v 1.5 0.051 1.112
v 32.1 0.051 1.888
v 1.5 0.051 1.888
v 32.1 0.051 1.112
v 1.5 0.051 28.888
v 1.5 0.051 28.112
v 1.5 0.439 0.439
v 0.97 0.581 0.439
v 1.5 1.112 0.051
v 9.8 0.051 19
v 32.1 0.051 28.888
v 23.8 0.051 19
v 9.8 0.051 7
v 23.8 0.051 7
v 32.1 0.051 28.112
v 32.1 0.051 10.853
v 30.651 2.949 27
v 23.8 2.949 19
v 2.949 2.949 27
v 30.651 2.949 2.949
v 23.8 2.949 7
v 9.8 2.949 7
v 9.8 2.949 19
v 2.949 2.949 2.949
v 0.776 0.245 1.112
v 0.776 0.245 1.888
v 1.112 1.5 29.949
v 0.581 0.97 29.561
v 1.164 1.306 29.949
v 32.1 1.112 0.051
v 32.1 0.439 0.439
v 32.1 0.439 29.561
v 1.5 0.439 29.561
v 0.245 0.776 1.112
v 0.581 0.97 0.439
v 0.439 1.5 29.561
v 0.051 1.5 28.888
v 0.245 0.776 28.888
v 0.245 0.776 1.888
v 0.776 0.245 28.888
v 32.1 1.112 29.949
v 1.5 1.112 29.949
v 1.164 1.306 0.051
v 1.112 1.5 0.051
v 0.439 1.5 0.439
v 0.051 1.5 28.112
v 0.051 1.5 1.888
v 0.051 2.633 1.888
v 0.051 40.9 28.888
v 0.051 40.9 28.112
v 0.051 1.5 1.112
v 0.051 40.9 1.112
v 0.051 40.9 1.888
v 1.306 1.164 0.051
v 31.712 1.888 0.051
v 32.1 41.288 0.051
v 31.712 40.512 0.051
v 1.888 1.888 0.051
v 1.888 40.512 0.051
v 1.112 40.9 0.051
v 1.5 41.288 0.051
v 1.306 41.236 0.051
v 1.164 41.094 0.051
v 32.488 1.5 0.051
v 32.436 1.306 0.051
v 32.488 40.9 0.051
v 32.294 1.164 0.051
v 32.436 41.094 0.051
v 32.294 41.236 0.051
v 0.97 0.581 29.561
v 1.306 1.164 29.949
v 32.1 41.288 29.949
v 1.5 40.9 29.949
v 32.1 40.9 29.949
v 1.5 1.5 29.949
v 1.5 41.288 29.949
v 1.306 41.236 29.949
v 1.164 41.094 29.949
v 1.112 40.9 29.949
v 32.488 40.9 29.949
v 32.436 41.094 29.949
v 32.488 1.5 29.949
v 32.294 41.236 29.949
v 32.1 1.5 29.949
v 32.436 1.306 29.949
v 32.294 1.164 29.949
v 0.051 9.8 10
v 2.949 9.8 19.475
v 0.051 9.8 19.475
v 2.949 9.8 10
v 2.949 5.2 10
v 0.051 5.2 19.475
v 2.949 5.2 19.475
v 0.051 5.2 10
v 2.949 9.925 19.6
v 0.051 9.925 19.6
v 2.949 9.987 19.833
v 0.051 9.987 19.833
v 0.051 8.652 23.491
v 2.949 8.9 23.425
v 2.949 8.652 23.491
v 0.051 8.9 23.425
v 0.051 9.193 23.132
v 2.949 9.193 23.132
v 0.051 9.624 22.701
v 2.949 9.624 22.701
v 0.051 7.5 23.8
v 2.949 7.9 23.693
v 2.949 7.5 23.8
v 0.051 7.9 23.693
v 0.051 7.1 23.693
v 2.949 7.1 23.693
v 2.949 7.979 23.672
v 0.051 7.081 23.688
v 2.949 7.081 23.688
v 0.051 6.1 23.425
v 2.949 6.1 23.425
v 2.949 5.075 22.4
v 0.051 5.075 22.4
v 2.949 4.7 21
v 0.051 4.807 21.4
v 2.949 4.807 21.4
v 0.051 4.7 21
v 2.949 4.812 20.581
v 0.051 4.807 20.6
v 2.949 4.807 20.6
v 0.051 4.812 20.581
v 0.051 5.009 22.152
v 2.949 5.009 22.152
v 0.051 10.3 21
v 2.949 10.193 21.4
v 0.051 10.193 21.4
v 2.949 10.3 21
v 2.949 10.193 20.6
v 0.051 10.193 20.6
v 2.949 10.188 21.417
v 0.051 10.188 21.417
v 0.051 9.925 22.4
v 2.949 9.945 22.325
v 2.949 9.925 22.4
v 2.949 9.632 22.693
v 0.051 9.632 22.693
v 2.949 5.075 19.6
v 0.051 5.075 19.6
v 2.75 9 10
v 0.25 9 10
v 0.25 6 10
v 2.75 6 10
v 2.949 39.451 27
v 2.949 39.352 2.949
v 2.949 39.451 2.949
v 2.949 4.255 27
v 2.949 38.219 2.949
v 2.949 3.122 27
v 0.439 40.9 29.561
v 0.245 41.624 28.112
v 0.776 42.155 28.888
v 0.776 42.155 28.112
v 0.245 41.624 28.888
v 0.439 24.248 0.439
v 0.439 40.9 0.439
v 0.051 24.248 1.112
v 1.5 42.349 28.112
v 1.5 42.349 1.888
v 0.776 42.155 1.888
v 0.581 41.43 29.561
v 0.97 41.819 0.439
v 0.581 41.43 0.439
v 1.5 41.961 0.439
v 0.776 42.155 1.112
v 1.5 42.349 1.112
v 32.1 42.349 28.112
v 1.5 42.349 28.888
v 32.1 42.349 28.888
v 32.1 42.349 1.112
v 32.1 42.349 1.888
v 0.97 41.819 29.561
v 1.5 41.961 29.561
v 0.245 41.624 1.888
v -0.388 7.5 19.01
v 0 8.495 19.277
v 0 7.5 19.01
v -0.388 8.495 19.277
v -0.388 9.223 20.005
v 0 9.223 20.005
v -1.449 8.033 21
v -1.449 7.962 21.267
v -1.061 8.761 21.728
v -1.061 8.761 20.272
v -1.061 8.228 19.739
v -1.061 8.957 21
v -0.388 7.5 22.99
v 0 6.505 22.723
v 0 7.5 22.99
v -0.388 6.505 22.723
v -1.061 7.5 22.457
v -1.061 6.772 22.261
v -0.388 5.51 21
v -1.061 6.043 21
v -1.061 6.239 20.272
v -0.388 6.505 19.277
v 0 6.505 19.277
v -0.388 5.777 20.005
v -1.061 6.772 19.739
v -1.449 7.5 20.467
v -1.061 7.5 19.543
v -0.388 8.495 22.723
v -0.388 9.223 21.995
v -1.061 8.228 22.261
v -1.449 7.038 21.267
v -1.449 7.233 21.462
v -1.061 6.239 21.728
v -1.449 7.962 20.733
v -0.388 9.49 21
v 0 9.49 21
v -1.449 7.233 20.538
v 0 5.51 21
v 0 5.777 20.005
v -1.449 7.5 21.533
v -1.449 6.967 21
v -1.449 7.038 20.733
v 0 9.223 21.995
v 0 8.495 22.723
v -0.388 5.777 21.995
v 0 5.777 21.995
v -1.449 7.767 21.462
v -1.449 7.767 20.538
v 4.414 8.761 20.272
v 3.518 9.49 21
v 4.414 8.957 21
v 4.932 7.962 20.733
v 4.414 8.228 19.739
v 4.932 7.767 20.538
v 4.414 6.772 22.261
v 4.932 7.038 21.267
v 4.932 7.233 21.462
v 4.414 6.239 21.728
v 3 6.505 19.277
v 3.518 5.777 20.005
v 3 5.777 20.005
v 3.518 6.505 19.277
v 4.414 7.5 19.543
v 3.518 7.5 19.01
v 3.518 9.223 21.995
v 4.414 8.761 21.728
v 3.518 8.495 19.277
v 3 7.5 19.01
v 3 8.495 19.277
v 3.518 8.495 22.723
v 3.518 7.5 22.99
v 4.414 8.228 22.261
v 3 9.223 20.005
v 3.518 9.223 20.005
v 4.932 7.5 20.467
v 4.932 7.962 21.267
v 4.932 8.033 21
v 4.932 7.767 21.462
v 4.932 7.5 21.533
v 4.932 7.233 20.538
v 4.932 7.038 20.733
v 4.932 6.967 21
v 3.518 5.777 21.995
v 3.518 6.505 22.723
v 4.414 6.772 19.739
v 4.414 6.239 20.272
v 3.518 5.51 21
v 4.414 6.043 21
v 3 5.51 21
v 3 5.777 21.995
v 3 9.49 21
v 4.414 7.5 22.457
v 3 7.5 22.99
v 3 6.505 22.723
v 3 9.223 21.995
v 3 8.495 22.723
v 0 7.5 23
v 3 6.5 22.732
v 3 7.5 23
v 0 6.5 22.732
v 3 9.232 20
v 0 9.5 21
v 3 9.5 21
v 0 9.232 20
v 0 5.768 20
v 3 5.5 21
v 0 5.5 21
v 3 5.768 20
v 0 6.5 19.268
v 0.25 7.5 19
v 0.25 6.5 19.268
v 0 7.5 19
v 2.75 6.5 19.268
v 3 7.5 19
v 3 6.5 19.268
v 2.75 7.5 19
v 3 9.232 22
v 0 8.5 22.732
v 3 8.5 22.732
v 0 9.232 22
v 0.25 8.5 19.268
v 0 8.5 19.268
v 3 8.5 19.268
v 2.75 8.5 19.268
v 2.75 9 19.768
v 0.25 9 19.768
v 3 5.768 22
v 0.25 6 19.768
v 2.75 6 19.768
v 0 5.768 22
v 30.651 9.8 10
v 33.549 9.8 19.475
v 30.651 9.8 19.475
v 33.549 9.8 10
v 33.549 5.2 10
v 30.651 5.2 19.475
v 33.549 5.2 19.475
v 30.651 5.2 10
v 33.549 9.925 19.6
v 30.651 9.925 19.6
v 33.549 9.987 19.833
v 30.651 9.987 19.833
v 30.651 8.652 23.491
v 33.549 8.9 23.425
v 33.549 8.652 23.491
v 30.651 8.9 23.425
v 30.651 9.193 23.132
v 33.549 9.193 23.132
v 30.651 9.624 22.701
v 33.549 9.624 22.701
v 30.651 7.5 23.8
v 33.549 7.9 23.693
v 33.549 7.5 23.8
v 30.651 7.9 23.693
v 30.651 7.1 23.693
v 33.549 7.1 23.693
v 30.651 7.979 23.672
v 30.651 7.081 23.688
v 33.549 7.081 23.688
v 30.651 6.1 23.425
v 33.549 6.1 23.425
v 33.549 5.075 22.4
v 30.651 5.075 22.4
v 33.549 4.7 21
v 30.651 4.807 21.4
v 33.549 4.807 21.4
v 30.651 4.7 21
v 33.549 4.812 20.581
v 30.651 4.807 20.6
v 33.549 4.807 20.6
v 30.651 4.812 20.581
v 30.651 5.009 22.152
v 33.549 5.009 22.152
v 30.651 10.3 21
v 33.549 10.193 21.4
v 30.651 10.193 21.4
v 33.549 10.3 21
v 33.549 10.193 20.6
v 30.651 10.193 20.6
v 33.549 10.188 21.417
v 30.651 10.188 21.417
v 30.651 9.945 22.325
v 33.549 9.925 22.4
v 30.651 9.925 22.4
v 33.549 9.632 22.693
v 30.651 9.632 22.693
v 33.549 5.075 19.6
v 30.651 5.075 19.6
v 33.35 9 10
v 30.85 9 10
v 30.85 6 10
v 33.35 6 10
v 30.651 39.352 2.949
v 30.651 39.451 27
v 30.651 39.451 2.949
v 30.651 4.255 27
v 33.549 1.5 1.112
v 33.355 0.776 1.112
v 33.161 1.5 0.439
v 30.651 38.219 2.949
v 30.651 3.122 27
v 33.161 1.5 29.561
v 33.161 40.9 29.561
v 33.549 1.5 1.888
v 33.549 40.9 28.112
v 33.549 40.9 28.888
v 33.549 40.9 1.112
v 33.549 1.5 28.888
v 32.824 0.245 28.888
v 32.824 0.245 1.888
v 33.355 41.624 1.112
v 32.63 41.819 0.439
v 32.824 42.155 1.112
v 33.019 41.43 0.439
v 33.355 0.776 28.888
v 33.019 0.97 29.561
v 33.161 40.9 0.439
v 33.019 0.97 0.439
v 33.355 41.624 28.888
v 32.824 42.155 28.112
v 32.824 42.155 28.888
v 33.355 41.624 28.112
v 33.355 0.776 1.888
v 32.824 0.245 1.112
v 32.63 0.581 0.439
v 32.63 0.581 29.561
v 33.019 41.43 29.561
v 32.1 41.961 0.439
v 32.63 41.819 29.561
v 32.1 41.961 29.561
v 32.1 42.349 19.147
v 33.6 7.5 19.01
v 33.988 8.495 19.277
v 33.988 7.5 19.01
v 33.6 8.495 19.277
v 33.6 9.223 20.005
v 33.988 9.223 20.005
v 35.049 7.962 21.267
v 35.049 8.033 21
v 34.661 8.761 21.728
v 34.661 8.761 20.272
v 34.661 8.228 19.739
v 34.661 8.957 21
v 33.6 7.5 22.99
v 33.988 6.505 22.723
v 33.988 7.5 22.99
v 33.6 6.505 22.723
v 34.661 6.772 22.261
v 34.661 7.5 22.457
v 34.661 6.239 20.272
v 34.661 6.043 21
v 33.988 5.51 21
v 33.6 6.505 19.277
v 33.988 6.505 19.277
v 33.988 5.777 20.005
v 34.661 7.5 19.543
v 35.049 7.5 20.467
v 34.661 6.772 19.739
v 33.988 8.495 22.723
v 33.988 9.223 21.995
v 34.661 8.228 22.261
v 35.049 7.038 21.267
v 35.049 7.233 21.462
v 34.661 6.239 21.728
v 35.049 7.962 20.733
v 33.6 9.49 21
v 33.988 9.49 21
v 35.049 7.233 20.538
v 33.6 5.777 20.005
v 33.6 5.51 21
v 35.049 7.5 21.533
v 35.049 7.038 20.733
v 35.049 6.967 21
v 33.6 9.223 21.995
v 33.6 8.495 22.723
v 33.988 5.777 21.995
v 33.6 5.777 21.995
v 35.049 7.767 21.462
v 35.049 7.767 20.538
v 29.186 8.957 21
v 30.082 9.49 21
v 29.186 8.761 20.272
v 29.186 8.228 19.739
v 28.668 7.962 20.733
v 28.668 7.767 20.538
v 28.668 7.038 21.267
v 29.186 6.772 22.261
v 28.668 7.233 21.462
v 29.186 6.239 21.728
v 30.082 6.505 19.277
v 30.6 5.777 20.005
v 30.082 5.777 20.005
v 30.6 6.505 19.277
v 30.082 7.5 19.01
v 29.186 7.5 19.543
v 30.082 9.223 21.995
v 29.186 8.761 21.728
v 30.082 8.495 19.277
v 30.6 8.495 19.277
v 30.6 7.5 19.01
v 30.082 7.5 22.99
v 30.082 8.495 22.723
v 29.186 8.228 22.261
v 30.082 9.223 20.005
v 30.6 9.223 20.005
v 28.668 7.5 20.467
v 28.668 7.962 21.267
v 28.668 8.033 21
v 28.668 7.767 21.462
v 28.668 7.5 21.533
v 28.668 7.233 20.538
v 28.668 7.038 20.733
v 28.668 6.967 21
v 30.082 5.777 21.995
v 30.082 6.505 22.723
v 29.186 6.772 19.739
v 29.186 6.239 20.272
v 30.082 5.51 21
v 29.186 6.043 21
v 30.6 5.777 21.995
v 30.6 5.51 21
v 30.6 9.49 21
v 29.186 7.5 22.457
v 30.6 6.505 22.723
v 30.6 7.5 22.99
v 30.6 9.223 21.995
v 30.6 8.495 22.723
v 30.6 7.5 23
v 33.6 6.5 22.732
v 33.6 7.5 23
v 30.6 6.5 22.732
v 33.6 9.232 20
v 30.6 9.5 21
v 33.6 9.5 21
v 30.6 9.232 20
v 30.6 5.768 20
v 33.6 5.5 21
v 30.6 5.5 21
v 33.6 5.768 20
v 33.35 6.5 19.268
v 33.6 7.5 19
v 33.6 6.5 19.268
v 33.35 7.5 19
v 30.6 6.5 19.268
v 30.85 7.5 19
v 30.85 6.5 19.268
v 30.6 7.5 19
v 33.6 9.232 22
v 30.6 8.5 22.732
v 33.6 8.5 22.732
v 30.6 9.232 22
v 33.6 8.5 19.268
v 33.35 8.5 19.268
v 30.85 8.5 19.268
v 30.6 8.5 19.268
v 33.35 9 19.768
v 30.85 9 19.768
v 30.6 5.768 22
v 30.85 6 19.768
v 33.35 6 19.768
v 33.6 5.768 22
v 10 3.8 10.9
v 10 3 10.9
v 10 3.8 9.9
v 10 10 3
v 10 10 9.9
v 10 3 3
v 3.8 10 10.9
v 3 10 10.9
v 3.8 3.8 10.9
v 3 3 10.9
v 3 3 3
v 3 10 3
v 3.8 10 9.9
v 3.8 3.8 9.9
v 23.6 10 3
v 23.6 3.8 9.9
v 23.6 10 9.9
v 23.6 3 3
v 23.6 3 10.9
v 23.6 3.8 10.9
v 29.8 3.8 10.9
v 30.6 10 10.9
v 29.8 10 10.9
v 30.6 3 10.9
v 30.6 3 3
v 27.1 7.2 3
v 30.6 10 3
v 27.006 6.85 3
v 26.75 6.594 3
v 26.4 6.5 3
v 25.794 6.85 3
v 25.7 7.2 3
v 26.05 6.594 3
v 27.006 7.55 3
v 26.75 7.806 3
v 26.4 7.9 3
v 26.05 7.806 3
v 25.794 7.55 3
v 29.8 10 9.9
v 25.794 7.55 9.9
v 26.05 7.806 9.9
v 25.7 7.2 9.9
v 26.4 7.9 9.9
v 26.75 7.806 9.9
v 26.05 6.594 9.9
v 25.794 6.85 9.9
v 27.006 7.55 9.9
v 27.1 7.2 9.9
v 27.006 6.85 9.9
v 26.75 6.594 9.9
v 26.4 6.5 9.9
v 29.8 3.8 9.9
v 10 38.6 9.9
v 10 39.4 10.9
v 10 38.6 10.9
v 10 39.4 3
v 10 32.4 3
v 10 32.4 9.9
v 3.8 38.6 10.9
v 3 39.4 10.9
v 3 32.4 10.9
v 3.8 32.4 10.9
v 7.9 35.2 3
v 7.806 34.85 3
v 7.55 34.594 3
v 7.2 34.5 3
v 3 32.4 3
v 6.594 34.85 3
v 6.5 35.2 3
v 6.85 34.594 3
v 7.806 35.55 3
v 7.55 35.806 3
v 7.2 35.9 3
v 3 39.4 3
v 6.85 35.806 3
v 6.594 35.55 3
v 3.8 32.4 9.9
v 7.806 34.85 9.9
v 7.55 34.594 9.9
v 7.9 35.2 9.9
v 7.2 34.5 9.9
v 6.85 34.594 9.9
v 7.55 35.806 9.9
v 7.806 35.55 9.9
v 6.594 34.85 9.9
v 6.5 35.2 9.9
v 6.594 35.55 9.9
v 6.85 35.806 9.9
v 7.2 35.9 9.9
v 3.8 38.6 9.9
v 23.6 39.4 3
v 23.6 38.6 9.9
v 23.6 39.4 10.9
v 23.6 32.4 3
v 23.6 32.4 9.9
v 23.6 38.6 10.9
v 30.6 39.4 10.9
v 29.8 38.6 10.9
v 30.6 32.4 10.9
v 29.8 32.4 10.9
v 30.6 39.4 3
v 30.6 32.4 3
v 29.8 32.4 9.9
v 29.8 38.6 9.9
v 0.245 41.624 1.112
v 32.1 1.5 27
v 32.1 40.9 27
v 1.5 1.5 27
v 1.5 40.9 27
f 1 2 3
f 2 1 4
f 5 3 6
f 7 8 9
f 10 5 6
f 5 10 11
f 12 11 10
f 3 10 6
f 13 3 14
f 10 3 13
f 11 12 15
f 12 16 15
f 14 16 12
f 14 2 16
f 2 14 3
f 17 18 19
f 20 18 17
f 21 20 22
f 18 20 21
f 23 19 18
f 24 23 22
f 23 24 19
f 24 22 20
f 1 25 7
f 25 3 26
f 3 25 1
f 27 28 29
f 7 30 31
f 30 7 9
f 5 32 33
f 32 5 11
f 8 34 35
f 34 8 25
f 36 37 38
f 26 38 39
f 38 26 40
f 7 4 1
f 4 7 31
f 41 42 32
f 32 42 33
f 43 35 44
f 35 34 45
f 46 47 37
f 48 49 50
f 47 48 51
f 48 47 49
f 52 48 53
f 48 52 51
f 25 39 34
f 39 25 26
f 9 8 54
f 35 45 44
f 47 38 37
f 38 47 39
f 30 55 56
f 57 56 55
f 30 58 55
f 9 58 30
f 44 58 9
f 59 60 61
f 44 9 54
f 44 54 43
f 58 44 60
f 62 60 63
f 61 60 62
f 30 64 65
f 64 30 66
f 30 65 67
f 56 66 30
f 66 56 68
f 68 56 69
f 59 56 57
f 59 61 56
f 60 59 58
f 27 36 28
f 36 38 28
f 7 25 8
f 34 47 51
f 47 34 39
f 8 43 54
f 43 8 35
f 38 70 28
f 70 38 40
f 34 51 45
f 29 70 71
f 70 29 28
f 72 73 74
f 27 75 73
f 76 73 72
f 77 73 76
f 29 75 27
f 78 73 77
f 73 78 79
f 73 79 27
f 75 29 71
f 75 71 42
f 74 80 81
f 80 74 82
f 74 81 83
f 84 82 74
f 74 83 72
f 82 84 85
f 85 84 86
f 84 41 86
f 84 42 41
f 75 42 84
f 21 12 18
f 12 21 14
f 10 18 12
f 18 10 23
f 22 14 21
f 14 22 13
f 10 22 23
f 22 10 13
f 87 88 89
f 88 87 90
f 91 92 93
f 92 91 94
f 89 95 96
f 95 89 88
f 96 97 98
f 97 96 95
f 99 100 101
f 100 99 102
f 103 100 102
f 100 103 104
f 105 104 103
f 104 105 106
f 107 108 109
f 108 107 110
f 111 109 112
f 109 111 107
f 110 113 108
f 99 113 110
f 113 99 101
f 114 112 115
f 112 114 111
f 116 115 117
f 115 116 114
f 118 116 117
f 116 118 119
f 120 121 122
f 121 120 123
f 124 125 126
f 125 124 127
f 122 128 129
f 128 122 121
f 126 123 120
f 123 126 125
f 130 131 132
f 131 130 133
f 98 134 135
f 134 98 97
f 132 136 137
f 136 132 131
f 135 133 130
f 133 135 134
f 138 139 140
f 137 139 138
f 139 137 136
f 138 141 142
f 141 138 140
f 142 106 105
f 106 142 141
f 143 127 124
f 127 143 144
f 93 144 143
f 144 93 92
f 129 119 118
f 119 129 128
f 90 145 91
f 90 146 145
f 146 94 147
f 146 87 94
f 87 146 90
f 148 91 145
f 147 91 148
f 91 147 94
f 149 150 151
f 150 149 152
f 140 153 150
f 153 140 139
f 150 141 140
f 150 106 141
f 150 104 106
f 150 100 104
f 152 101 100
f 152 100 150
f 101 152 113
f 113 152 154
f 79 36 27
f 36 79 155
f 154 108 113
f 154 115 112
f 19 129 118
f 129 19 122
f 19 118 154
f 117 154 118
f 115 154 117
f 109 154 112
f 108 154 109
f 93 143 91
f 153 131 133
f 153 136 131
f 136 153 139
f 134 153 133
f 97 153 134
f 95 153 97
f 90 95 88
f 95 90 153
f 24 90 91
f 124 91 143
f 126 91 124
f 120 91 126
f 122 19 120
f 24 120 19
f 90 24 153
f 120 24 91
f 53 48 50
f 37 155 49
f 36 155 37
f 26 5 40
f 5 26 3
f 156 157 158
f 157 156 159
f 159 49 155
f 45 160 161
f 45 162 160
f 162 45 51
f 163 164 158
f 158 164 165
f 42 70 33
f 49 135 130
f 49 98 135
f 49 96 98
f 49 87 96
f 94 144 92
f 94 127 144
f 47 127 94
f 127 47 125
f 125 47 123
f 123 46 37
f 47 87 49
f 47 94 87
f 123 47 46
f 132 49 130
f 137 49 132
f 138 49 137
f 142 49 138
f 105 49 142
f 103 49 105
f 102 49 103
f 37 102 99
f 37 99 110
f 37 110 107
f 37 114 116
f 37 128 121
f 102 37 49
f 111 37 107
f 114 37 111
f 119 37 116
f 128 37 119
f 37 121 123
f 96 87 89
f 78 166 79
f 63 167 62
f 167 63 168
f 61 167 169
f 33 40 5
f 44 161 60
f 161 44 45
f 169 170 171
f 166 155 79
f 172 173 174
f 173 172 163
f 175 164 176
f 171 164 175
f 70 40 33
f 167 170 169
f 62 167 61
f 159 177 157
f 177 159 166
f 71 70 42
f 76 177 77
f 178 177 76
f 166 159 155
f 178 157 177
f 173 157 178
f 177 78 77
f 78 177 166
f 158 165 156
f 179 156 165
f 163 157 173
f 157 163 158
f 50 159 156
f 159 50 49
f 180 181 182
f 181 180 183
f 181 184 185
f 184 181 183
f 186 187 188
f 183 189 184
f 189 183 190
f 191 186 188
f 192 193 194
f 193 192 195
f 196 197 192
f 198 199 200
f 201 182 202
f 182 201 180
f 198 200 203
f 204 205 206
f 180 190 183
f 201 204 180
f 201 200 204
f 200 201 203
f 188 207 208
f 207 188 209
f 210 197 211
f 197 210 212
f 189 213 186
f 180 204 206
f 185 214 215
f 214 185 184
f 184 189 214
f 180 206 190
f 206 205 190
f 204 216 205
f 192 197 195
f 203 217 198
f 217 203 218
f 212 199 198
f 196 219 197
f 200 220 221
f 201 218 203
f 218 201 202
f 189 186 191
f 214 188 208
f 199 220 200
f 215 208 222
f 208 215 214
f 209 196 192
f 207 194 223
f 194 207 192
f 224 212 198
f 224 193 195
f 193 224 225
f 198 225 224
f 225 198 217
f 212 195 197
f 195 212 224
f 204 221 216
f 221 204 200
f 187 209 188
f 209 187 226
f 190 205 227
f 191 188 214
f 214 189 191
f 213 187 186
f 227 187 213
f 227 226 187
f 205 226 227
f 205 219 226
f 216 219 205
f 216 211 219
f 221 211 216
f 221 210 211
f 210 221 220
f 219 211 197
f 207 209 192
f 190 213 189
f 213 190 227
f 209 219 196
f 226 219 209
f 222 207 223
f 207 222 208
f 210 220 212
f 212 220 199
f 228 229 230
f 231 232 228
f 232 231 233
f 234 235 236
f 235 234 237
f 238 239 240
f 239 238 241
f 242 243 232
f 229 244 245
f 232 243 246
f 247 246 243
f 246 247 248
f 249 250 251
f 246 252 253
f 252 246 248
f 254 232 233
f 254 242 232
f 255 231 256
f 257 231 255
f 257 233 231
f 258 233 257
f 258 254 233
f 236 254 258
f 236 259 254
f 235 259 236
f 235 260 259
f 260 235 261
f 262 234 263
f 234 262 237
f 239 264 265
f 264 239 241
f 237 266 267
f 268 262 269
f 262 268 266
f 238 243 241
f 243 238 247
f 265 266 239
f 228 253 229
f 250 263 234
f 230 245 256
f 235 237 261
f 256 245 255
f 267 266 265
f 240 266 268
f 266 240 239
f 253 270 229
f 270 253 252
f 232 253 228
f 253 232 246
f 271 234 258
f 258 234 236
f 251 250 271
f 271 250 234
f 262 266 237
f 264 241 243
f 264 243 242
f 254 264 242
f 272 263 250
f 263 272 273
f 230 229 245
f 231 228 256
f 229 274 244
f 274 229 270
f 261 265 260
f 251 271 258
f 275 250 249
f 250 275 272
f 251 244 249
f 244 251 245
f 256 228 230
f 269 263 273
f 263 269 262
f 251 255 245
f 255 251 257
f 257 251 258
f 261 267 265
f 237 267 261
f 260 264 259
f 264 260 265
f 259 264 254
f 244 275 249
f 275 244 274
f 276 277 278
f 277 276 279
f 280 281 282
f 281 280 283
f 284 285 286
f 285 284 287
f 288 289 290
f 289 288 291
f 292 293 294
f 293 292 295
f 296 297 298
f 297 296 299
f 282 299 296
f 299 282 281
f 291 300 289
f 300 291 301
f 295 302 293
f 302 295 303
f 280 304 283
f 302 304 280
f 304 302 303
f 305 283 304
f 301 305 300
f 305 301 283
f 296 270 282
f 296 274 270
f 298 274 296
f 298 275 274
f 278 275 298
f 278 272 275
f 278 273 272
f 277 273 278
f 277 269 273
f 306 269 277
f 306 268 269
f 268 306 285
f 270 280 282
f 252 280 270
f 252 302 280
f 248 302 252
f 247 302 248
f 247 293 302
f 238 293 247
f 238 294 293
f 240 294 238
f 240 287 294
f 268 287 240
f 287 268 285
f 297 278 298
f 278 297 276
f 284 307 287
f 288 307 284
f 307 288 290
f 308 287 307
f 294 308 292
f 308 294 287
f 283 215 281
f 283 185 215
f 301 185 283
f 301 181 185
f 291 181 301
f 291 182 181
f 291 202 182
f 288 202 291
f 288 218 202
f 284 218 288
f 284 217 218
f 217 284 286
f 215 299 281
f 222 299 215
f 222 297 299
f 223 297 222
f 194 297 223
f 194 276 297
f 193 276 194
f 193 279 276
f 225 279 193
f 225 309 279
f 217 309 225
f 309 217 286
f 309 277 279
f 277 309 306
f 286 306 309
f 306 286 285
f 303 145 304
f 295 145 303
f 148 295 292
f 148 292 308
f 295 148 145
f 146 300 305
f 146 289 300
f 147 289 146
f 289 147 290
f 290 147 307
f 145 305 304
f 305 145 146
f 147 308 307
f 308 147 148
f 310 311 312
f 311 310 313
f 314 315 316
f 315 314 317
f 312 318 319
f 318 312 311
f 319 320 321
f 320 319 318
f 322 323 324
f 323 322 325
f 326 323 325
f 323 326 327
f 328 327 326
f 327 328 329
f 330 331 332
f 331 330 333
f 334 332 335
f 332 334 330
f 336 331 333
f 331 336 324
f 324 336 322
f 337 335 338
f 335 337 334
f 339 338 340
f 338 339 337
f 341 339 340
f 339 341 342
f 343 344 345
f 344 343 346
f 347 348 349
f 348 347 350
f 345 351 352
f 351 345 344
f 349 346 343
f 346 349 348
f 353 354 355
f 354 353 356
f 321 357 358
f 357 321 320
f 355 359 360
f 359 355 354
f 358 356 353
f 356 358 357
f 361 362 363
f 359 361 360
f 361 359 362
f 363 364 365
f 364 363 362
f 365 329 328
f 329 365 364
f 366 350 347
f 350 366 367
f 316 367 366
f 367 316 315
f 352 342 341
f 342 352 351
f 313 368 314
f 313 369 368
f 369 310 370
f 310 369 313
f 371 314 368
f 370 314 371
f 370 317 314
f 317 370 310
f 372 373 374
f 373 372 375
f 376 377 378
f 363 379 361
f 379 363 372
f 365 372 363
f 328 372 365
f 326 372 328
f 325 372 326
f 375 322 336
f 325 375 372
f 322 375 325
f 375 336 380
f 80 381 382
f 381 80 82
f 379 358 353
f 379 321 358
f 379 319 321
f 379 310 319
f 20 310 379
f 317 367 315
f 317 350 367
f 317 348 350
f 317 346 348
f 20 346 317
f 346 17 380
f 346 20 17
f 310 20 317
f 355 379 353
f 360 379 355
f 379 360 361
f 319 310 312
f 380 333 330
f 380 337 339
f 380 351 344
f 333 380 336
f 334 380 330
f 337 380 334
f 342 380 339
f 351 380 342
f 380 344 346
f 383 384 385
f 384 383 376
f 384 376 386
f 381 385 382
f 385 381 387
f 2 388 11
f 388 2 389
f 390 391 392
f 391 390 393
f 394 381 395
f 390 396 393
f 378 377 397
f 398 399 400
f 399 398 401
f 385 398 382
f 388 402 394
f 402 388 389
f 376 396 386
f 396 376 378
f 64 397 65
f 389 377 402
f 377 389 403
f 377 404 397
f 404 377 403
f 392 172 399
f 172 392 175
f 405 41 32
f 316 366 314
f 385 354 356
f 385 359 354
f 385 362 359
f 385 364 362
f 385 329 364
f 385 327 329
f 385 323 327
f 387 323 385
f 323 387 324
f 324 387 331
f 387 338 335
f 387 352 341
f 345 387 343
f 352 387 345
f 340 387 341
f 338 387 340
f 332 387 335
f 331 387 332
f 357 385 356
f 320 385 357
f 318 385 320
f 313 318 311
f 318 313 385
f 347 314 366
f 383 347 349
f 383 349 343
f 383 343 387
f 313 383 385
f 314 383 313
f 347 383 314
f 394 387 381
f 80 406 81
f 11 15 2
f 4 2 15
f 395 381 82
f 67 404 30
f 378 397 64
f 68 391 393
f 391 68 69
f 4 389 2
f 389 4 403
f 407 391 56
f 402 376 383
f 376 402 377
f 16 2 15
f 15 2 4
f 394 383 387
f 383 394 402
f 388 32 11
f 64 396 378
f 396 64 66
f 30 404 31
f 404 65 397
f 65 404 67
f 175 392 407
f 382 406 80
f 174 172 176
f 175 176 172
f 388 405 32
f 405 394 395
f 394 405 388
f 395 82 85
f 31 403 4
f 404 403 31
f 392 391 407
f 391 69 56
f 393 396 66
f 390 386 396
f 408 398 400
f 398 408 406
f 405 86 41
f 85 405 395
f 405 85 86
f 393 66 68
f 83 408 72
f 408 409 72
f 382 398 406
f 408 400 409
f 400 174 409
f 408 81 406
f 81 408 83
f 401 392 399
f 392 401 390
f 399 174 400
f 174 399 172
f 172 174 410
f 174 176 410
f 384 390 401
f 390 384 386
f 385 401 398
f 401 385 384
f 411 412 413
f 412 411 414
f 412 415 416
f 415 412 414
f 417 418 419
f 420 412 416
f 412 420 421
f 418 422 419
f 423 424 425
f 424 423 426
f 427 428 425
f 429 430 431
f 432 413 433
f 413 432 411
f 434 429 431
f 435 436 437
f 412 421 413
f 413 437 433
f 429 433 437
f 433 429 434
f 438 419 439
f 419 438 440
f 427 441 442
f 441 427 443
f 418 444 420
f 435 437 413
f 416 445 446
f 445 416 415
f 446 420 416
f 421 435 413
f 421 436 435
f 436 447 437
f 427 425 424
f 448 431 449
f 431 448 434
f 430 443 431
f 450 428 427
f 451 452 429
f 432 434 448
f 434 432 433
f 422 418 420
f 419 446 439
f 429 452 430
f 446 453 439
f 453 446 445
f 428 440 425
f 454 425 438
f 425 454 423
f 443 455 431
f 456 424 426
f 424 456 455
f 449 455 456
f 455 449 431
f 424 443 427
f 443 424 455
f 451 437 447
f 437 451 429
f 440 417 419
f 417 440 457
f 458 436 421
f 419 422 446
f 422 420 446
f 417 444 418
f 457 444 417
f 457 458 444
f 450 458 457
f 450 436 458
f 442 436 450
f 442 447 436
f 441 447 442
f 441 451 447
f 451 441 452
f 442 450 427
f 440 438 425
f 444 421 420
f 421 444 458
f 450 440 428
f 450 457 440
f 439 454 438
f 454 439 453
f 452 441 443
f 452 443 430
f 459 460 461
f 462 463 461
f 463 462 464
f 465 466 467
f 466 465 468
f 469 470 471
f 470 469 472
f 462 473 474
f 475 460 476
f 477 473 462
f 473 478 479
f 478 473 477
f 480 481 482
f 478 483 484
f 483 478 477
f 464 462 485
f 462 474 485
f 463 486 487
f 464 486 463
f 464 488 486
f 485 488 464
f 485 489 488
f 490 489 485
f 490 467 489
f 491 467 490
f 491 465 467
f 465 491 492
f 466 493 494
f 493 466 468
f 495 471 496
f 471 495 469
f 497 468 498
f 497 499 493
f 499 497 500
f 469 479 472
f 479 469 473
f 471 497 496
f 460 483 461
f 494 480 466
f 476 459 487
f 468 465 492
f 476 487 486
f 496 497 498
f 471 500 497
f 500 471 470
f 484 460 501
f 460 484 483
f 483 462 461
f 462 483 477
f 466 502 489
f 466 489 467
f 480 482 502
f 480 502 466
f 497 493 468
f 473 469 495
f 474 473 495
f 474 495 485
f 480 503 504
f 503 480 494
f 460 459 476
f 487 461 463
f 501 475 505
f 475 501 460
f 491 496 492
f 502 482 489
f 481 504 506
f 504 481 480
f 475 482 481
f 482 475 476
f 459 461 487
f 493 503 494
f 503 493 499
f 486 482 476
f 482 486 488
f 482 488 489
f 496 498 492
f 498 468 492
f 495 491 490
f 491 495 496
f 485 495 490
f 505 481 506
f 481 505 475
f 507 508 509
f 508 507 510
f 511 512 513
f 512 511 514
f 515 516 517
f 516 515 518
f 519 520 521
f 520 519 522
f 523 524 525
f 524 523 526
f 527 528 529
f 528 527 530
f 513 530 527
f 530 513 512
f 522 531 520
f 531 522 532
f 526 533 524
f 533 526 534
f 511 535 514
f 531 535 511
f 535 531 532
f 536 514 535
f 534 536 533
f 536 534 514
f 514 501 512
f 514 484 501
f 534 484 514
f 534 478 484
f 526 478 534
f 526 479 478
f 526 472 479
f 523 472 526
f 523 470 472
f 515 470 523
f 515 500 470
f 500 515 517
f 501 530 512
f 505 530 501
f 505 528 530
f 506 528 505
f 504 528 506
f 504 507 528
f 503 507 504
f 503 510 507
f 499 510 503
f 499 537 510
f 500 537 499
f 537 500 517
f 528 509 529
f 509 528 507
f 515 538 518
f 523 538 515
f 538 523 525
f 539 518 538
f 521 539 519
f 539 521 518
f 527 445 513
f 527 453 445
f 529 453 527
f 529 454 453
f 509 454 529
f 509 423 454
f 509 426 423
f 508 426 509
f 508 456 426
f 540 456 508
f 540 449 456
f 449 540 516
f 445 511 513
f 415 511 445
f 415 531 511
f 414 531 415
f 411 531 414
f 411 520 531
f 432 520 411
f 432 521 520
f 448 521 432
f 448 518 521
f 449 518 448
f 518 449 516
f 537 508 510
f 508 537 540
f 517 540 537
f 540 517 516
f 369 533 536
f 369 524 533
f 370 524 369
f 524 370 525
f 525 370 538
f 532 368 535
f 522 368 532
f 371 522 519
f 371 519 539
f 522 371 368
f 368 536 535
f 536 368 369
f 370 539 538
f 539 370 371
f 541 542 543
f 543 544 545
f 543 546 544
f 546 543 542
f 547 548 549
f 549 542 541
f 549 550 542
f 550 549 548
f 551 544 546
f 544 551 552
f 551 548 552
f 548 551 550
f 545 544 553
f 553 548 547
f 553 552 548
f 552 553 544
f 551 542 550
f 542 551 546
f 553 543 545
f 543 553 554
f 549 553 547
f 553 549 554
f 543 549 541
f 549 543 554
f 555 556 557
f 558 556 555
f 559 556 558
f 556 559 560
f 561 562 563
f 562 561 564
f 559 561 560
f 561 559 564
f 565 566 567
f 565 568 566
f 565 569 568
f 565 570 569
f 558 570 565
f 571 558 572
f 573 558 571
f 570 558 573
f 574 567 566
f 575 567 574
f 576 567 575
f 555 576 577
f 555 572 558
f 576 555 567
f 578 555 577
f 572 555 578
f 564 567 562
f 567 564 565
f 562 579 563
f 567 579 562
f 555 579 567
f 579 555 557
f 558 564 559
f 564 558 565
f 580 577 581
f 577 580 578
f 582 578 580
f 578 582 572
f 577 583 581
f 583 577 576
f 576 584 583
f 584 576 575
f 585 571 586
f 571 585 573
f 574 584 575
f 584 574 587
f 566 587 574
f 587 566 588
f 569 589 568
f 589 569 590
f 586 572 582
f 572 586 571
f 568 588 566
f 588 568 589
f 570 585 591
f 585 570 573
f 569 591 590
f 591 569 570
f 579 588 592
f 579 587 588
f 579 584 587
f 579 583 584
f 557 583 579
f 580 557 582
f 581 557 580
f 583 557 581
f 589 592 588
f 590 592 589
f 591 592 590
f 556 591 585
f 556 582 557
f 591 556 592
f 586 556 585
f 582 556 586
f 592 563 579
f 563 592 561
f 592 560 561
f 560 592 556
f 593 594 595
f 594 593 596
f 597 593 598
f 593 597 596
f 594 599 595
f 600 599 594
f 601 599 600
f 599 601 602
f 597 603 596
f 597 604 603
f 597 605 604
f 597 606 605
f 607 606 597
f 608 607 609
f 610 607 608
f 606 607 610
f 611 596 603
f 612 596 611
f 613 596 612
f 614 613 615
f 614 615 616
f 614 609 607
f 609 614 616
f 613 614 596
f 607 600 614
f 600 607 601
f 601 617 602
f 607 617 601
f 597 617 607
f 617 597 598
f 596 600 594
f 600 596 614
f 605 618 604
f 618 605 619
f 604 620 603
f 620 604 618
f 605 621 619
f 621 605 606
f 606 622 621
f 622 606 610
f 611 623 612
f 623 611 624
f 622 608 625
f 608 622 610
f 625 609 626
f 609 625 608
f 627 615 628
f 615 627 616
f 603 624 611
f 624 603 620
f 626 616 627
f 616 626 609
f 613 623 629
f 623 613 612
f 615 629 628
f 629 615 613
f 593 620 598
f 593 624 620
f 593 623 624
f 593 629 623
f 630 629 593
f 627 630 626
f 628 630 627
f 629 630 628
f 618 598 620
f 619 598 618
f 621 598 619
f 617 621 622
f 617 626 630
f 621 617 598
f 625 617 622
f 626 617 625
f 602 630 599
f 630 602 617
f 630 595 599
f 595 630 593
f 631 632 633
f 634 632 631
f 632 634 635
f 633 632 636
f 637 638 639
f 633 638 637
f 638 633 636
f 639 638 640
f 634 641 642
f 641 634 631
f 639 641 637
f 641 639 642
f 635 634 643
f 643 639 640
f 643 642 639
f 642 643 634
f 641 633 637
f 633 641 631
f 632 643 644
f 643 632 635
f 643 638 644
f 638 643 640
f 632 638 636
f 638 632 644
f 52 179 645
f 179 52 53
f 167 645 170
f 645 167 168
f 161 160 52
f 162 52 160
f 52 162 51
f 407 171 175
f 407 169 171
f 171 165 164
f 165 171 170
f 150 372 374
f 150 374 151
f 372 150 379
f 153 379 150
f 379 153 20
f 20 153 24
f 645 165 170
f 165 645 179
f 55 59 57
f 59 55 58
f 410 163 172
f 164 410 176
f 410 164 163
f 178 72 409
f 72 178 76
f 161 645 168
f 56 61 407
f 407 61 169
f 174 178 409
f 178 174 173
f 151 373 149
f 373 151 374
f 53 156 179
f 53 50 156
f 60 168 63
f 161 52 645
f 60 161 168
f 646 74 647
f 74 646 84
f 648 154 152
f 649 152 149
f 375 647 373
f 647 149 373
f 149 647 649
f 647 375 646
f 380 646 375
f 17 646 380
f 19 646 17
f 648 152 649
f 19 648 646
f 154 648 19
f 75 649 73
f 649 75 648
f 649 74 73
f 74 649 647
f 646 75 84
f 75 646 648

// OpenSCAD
union() {
	difference() {
		union() {
			minkowski() {
				translate(v = [1.4999998500, 1.4999998500, 1.4999998500]) {
					cube(size = [30.6000003000, 39.4000003000, 0.0000003000]);
				}
				sphere($fn = 12, r = 1.4999998500);
			}
			difference() {
				minkowski() {
					translate(v = [1.4999998500, 1.4999998500, 1.4999998500]) {
						cube(size = [30.6000003000, 0.0000003000, 27.0000003000]);
					}
					sphere($fn = 12, r = 1.4999998500);
				}
				translate(v = [9.8000000000, -0.5000000000, 7]) {
					cube(size = [14, 4, 12]);
				}
			}
			union() {
				difference() {
					minkowski() {
						translate(v = [1.4999998500, 1.4999998500, 1.4999998500]) {
							cube(size = [0.0000003000, 39.4000003000, 27.0000003000]);
						}
						sphere($fn = 12, r = 1.4999998500);
					}
					translate(v = [-1, 6.0000000000, 0]) {
						difference() {
							minkowski() {
								translate(v = [0, 0, 3]) {
									union() {
										translate(v = [0.2500000000, 0, 0]) {
											cube(size = [2.5000000000, 3, 18.0000000000]);
										}
										translate(v = [0, 1.5000000000, 18.0000000000]) {
											scale(v = [0.7500000000, 1.0300000000, 1.0300000000]) {
												rotate(a = 90, v = [0, 1, 0]) {
													sphere($fn = 12, r = 2);
												}
											}
											translate(v = [3, 0, 0]) {
												scale(v = [1, 1.0300000000, 1.0300000000]) {
													rotate(a = 90, v = [0, 1, 0]) {
														sphere($fn = 12, r = 2);
													}
												}
											}
											rotate(a = 90, v = [0, 1, 0]) {
												cylinder($fn = 12, h = 3, r = 2);
											}
										}
									}
								}
								rotate(a = 90, v = [0, 1, 0]) {
									cylinder($fn = 12, h = 4, r = 0.8000000000);
								}
							}
							translate(v = [-5, -5, 0]) {
								cube(size = [20, 20, 10]);
							}
						}
					}
				}
				translate(v = [0, 6.0000000000, 0]) {
					translate(v = [0, 0, 3]) {
						union() {
							translate(v = [0.2500000000, 0, 0]) {
								cube(size = [2.5000000000, 3, 18.0000000000]);
							}
							translate(v = [0, 1.5000000000, 18.0000000000]) {
								scale(v = [0.7500000000, 1.0300000000, 1.0300000000]) {
									rotate(a = 90, v = [0, 1, 0]) {
										sphere($fn = 12, r = 2);
									}
								}
								translate(v = [3, 0, 0]) {
									scale(v = [1, 1.0300000000, 1.0300000000]) {
										rotate(a = 90, v = [0, 1, 0]) {
											sphere($fn = 12, r = 2);
										}
									}
								}
								rotate(a = 90, v = [0, 1, 0]) {
									cylinder($fn = 12, h = 3, r = 2);
								}
							}
						}
					}
				}
			}
			translate(v = [33.6000000000, 0, 0]) {
				scale(v = [-1, 1, 1]) {
					union() {
						difference() {
							minkowski() {
								translate(v = [1.4999998500, 1.4999998500, 1.4999998500]) {
									cube(size = [0.0000003000, 39.4000003000, 27.0000003000]);
								}
								sphere($fn = 12, r = 1.4999998500);
							}
							translate(v = [-1, 6.0000000000, 0]) {
								difference() {
									minkowski() {
										translate(v = [0, 0, 3]) {
											union() {
												translate(v = [0.2500000000, 0, 0]) {
													cube(size = [2.5000000000, 3, 18.0000000000]);
												}
												translate(v = [0, 1.5000000000, 18.0000000000]) {
													scale(v = [0.7500000000, 1.0300000000, 1.0300000000]) {
														rotate(a = 90, v = [0, 1, 0]) {
															sphere($fn = 12, r = 2);
														}
													}
													translate(v = [3, 0, 0]) {
														scale(v = [1, 1.0300000000, 1.0300000000]) {
															rotate(a = 90, v = [0, 1, 0]) {
																sphere($fn = 12, r = 2);
															}
														}
													}
													rotate(a = 90, v = [0, 1, 0]) {
														cylinder($fn = 12, h = 3, r = 2);
													}
												}
											}
										}
										rotate(a = 90, v = [0, 1, 0]) {
											cylinder($fn = 12, h = 4, r = 0.8000000000);
										}
									}
									translate(v = [-5, -5, 0]) {
										cube(size = [20, 20, 10]);
									}
								}
							}
						}
						translate(v = [0, 6.0000000000, 0]) {
							translate(v = [0, 0, 3]) {
								union() {
									translate(v = [0.2500000000, 0, 0]) {
										cube(size = [2.5000000000, 3, 18.0000000000]);
									}
									translate(v = [0, 1.5000000000, 18.0000000000]) {
										scale(v = [0.7500000000, 1.0300000000, 1.0300000000]) {
											rotate(a = 90, v = [0, 1, 0]) {
												sphere($fn = 12, r = 2);
											}
										}
										translate(v = [3, 0, 0]) {
											scale(v = [1, 1.0300000000, 1.0300000000]) {
												rotate(a = 90, v = [0, 1, 0]) {
													sphere($fn = 12, r = 2);
												}
											}
										}
										rotate(a = 90, v = [0, 1, 0]) {
											cylinder($fn = 12, h = 3, r = 2);
										}
									}
								}
							}
						}
					}
				}
			}
			translate(v = [0, 39.4000000000, 0]) {
				minkowski() {
					translate(v = [1.4999998500, 1.4999998500, 1.4999998500]) {
						cube(size = [30.6000003000, 0.0000003000, 27.0000003000]);
					}
					sphere($fn = 12, r = 1.4999998500);
				}
			}
			translate(v = [3, 3, 3]) {
				difference() {
					cube(size = [7, 7, 7.9000000000]);
					translate(v = [0.8000000000, 0.8000000000, 6.9000000000]) {
						cube(size = [7, 7, 1.9000000000]);
					}
				}
			}
			translate(v = [30.6000000000, 3, 3]) {
				scale(v = [-1, 1, 1]) {
					difference() {
						difference() {
							cube(size = [7, 7, 7.9000000000]);
							translate(v = [4.2000000000, 4.2000000000, -1]) {
								cylinder($fn = 12, h = 9.9000000000, r = 0.7000000000);
							}
						}
						translate(v = [0.8000000000, 0.8000000000, 6.9000000000]) {
							cube(size = [7, 7, 1.9000000000]);
						}
					}
				}
			}
			translate(v = [3, 39.4000000000, 3]) {
				scale(v = [1, -1, 1]) {
					difference() {
						difference() {
							cube(size = [7, 7, 7.9000000000]);
							translate(v = [4.2000000000, 4.2000000000, -1]) {
								cylinder($fn = 12, h = 9.9000000000, r = 0.7000000000);
							}
						}
						translate(v = [0.8000000000, 0.8000000000, 6.9000000000]) {
							cube(size = [7, 7, 1.9000000000]);
						}
					}
				}
			}
			translate(v = [30.6000000000, 39.4000000000, 3]) {
				scale(v = [-1, -1, 1]) {
					difference() {
						cube(size = [7, 7, 7.9000000000]);
						translate(v = [0.8000000000, 0.8000000000, 6.9000000000]) {
							cube(size = [7, 7, 1.9000000000]);
						}
					}
				}
			}
		}
		translate(v = [1.5000000000, 1.5000000000, 27.0000000000]) {
			cube(size = [30.6000000000, 39.4000000000, 4]);
		}
	}
}
